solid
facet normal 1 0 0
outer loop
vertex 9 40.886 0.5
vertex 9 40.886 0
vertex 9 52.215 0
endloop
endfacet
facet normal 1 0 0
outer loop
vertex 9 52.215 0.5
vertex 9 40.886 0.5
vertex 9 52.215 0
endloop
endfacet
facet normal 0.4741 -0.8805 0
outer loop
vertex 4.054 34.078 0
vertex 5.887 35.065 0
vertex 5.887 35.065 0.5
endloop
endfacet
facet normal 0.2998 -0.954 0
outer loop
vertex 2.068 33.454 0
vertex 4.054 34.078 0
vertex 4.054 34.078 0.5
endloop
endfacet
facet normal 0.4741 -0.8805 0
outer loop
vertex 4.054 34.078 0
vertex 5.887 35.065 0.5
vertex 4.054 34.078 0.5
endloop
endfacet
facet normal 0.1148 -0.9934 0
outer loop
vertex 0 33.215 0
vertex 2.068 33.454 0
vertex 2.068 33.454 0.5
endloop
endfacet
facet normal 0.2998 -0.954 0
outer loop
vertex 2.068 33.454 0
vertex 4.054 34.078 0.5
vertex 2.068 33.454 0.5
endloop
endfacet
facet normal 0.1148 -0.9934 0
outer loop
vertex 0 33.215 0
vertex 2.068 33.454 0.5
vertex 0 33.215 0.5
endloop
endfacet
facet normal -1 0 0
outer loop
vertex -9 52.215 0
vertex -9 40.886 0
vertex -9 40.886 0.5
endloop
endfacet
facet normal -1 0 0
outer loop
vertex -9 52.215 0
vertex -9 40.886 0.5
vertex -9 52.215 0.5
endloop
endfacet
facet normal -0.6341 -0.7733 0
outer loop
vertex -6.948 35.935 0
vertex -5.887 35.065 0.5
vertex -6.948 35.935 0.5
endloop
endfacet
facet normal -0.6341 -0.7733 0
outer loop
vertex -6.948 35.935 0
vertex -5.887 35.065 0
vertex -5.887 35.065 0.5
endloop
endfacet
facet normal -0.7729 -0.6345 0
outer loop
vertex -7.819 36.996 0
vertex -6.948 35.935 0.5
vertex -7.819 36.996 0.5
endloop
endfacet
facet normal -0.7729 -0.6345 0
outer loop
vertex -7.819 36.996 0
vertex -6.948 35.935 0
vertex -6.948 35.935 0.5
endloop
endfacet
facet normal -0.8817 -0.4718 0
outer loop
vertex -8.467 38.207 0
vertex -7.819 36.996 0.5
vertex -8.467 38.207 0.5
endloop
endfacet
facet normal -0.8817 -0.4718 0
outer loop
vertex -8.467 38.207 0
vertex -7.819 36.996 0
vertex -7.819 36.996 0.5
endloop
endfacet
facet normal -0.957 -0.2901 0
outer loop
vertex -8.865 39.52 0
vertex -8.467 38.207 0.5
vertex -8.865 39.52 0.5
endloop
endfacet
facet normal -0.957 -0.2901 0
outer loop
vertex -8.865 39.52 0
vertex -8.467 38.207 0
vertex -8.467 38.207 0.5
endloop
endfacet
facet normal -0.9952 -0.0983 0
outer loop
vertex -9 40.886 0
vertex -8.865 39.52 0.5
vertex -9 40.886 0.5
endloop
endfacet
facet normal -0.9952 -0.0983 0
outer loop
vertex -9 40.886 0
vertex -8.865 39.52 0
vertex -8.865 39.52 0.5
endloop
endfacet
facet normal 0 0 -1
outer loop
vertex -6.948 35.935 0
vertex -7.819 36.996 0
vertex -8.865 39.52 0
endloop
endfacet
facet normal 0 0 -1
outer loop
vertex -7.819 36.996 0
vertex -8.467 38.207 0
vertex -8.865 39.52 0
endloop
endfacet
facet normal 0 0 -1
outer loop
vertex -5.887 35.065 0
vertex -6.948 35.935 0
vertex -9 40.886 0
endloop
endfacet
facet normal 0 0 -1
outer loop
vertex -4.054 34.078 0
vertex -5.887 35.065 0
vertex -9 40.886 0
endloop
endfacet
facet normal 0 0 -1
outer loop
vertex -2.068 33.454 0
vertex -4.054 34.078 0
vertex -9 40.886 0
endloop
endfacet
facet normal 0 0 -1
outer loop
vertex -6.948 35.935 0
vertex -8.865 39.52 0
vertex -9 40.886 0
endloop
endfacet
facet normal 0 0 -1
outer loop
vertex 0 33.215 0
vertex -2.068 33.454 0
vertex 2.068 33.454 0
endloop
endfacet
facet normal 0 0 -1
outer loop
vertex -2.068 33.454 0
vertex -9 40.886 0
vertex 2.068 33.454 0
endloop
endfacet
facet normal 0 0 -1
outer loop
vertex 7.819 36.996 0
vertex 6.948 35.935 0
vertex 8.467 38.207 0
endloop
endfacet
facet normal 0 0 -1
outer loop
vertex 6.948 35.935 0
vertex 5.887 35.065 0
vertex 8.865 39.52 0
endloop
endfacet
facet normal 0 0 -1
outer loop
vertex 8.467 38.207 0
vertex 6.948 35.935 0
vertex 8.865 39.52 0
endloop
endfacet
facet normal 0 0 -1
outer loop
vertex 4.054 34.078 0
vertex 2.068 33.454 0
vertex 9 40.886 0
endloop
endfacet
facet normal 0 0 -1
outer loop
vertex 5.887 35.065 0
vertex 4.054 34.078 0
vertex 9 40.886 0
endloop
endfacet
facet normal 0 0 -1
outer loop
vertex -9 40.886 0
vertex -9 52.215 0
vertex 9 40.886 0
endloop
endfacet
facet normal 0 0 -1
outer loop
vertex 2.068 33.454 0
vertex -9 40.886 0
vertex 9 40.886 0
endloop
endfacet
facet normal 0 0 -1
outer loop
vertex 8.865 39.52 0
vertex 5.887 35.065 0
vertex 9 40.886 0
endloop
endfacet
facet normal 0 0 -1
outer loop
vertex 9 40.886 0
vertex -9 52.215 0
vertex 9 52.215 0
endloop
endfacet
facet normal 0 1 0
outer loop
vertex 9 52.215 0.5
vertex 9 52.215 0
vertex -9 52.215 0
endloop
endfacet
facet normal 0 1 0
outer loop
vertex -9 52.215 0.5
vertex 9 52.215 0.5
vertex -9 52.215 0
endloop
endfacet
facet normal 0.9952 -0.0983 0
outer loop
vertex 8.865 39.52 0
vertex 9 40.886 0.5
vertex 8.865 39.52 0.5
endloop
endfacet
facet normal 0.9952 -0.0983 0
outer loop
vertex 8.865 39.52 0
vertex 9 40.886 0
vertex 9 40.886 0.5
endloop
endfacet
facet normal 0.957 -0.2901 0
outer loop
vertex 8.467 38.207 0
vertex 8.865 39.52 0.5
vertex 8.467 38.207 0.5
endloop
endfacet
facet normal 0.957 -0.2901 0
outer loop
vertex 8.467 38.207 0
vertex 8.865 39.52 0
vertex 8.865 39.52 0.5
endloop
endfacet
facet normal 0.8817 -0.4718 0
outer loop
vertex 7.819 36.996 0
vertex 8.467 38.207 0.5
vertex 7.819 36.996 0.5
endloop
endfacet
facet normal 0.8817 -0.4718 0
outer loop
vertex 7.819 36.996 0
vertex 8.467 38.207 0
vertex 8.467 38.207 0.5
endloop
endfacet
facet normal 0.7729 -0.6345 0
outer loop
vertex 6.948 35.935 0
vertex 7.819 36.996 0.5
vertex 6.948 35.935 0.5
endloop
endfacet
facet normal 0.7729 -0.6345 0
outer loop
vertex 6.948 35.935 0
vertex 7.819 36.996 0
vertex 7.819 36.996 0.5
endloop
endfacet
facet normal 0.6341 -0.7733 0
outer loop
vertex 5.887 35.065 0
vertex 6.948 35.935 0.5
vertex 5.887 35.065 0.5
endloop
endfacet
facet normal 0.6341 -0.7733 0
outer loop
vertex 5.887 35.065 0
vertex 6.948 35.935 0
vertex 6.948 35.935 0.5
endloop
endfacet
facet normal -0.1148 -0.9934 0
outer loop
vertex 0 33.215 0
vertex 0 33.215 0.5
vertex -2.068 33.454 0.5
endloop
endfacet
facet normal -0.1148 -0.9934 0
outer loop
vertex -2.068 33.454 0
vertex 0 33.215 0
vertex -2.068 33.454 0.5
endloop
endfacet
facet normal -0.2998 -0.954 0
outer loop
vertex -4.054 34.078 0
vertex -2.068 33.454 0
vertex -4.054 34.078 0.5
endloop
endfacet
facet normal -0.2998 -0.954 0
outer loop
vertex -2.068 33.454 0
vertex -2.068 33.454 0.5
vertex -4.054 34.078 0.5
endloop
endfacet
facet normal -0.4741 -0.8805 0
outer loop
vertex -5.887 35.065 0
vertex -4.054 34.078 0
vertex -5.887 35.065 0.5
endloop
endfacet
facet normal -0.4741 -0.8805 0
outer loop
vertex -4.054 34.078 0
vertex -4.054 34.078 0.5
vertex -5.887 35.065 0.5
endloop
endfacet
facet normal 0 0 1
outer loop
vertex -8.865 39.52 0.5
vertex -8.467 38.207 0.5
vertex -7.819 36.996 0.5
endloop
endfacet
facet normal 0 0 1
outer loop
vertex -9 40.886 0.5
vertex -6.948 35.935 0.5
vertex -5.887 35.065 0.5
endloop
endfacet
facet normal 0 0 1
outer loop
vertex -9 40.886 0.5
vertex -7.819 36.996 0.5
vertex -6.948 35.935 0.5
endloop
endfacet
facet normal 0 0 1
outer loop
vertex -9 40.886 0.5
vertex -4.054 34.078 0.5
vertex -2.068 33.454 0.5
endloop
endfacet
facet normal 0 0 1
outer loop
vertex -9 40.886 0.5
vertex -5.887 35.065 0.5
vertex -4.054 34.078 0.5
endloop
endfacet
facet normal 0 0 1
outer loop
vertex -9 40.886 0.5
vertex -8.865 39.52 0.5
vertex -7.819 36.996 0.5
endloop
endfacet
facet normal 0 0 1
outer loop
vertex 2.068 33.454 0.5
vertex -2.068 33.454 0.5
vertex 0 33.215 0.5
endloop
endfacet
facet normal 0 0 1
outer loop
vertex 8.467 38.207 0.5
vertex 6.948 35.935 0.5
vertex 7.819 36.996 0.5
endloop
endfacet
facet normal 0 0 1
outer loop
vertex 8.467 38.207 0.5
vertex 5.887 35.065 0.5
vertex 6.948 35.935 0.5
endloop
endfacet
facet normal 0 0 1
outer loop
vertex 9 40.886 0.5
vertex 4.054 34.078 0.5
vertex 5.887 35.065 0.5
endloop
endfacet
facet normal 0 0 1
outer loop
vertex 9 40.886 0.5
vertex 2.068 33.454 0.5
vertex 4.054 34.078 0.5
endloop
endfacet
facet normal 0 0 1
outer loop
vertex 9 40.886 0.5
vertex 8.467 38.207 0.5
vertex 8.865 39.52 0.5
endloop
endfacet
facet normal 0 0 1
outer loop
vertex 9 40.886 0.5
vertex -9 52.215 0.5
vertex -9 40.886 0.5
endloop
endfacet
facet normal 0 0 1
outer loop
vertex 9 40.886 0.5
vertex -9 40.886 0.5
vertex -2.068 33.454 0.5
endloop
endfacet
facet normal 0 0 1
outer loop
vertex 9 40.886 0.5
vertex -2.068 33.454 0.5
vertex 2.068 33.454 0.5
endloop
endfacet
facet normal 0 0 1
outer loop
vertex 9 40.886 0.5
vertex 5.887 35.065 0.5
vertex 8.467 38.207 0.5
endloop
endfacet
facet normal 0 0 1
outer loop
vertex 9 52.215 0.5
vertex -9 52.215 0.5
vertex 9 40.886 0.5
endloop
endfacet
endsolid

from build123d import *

# Parameters (mm, degrees)
SKETCH_1_W          = 9
SKETCH_1_H          = 19
EXTRUDE_2_DEPTH     = 0.5
CUT_EXTRUDE_1_DEPTH = 53.98770037
FILLET_1_R          = 7


with BuildPart() as part:
    # 草圖1 → 填料-伸長2 (new body)
    with BuildSketch(Plane.XY):
        with Locations((4.5, 42.715384615)):
            Rectangle(SKETCH_1_W, SKETCH_1_H)
        with Locations((-4.5, 42.715384615)):
            Rectangle(SKETCH_1_W, SKETCH_1_H)
    extrude(amount=EXTRUDE_2_DEPTH)

    # 草圖3 → 除料-伸長1 (cut, through all)
    with BuildSketch(Plane.XY.offset(0.5)):
        with BuildLine():
            Line((0, 33.215384615), (9, 33.215384615))
            Line((9, 33.215384615), (9, 38.215384615))
            ThreePointArc((9, 38.215384615), (5.121083379, 34.597434532), (0, 33.215384615))
        make_face()
        with BuildLine():
            Line((-9, 33.215384615), (0, 33.215384615))
            ThreePointArc((0, 33.215384615), (-5.121083379, 34.597434532), (-9, 38.215384615))
            Line((-9, 38.215384615), (-9, 33.215384615))
        make_face()
    extrude(amount=-CUT_EXTRUDE_1_DEPTH, mode=Mode.SUBTRACT)

    # 圓角1
    fillet_1_edges = [part.edges().sort_by_distance(p)[0] for p in [
        (9, 38.215384615, 0.25),
        (-9, 38.215384615, 0.25),
    ]]
    fillet(fillet_1_edges, radius=FILLET_1_R)


solid = part.part
